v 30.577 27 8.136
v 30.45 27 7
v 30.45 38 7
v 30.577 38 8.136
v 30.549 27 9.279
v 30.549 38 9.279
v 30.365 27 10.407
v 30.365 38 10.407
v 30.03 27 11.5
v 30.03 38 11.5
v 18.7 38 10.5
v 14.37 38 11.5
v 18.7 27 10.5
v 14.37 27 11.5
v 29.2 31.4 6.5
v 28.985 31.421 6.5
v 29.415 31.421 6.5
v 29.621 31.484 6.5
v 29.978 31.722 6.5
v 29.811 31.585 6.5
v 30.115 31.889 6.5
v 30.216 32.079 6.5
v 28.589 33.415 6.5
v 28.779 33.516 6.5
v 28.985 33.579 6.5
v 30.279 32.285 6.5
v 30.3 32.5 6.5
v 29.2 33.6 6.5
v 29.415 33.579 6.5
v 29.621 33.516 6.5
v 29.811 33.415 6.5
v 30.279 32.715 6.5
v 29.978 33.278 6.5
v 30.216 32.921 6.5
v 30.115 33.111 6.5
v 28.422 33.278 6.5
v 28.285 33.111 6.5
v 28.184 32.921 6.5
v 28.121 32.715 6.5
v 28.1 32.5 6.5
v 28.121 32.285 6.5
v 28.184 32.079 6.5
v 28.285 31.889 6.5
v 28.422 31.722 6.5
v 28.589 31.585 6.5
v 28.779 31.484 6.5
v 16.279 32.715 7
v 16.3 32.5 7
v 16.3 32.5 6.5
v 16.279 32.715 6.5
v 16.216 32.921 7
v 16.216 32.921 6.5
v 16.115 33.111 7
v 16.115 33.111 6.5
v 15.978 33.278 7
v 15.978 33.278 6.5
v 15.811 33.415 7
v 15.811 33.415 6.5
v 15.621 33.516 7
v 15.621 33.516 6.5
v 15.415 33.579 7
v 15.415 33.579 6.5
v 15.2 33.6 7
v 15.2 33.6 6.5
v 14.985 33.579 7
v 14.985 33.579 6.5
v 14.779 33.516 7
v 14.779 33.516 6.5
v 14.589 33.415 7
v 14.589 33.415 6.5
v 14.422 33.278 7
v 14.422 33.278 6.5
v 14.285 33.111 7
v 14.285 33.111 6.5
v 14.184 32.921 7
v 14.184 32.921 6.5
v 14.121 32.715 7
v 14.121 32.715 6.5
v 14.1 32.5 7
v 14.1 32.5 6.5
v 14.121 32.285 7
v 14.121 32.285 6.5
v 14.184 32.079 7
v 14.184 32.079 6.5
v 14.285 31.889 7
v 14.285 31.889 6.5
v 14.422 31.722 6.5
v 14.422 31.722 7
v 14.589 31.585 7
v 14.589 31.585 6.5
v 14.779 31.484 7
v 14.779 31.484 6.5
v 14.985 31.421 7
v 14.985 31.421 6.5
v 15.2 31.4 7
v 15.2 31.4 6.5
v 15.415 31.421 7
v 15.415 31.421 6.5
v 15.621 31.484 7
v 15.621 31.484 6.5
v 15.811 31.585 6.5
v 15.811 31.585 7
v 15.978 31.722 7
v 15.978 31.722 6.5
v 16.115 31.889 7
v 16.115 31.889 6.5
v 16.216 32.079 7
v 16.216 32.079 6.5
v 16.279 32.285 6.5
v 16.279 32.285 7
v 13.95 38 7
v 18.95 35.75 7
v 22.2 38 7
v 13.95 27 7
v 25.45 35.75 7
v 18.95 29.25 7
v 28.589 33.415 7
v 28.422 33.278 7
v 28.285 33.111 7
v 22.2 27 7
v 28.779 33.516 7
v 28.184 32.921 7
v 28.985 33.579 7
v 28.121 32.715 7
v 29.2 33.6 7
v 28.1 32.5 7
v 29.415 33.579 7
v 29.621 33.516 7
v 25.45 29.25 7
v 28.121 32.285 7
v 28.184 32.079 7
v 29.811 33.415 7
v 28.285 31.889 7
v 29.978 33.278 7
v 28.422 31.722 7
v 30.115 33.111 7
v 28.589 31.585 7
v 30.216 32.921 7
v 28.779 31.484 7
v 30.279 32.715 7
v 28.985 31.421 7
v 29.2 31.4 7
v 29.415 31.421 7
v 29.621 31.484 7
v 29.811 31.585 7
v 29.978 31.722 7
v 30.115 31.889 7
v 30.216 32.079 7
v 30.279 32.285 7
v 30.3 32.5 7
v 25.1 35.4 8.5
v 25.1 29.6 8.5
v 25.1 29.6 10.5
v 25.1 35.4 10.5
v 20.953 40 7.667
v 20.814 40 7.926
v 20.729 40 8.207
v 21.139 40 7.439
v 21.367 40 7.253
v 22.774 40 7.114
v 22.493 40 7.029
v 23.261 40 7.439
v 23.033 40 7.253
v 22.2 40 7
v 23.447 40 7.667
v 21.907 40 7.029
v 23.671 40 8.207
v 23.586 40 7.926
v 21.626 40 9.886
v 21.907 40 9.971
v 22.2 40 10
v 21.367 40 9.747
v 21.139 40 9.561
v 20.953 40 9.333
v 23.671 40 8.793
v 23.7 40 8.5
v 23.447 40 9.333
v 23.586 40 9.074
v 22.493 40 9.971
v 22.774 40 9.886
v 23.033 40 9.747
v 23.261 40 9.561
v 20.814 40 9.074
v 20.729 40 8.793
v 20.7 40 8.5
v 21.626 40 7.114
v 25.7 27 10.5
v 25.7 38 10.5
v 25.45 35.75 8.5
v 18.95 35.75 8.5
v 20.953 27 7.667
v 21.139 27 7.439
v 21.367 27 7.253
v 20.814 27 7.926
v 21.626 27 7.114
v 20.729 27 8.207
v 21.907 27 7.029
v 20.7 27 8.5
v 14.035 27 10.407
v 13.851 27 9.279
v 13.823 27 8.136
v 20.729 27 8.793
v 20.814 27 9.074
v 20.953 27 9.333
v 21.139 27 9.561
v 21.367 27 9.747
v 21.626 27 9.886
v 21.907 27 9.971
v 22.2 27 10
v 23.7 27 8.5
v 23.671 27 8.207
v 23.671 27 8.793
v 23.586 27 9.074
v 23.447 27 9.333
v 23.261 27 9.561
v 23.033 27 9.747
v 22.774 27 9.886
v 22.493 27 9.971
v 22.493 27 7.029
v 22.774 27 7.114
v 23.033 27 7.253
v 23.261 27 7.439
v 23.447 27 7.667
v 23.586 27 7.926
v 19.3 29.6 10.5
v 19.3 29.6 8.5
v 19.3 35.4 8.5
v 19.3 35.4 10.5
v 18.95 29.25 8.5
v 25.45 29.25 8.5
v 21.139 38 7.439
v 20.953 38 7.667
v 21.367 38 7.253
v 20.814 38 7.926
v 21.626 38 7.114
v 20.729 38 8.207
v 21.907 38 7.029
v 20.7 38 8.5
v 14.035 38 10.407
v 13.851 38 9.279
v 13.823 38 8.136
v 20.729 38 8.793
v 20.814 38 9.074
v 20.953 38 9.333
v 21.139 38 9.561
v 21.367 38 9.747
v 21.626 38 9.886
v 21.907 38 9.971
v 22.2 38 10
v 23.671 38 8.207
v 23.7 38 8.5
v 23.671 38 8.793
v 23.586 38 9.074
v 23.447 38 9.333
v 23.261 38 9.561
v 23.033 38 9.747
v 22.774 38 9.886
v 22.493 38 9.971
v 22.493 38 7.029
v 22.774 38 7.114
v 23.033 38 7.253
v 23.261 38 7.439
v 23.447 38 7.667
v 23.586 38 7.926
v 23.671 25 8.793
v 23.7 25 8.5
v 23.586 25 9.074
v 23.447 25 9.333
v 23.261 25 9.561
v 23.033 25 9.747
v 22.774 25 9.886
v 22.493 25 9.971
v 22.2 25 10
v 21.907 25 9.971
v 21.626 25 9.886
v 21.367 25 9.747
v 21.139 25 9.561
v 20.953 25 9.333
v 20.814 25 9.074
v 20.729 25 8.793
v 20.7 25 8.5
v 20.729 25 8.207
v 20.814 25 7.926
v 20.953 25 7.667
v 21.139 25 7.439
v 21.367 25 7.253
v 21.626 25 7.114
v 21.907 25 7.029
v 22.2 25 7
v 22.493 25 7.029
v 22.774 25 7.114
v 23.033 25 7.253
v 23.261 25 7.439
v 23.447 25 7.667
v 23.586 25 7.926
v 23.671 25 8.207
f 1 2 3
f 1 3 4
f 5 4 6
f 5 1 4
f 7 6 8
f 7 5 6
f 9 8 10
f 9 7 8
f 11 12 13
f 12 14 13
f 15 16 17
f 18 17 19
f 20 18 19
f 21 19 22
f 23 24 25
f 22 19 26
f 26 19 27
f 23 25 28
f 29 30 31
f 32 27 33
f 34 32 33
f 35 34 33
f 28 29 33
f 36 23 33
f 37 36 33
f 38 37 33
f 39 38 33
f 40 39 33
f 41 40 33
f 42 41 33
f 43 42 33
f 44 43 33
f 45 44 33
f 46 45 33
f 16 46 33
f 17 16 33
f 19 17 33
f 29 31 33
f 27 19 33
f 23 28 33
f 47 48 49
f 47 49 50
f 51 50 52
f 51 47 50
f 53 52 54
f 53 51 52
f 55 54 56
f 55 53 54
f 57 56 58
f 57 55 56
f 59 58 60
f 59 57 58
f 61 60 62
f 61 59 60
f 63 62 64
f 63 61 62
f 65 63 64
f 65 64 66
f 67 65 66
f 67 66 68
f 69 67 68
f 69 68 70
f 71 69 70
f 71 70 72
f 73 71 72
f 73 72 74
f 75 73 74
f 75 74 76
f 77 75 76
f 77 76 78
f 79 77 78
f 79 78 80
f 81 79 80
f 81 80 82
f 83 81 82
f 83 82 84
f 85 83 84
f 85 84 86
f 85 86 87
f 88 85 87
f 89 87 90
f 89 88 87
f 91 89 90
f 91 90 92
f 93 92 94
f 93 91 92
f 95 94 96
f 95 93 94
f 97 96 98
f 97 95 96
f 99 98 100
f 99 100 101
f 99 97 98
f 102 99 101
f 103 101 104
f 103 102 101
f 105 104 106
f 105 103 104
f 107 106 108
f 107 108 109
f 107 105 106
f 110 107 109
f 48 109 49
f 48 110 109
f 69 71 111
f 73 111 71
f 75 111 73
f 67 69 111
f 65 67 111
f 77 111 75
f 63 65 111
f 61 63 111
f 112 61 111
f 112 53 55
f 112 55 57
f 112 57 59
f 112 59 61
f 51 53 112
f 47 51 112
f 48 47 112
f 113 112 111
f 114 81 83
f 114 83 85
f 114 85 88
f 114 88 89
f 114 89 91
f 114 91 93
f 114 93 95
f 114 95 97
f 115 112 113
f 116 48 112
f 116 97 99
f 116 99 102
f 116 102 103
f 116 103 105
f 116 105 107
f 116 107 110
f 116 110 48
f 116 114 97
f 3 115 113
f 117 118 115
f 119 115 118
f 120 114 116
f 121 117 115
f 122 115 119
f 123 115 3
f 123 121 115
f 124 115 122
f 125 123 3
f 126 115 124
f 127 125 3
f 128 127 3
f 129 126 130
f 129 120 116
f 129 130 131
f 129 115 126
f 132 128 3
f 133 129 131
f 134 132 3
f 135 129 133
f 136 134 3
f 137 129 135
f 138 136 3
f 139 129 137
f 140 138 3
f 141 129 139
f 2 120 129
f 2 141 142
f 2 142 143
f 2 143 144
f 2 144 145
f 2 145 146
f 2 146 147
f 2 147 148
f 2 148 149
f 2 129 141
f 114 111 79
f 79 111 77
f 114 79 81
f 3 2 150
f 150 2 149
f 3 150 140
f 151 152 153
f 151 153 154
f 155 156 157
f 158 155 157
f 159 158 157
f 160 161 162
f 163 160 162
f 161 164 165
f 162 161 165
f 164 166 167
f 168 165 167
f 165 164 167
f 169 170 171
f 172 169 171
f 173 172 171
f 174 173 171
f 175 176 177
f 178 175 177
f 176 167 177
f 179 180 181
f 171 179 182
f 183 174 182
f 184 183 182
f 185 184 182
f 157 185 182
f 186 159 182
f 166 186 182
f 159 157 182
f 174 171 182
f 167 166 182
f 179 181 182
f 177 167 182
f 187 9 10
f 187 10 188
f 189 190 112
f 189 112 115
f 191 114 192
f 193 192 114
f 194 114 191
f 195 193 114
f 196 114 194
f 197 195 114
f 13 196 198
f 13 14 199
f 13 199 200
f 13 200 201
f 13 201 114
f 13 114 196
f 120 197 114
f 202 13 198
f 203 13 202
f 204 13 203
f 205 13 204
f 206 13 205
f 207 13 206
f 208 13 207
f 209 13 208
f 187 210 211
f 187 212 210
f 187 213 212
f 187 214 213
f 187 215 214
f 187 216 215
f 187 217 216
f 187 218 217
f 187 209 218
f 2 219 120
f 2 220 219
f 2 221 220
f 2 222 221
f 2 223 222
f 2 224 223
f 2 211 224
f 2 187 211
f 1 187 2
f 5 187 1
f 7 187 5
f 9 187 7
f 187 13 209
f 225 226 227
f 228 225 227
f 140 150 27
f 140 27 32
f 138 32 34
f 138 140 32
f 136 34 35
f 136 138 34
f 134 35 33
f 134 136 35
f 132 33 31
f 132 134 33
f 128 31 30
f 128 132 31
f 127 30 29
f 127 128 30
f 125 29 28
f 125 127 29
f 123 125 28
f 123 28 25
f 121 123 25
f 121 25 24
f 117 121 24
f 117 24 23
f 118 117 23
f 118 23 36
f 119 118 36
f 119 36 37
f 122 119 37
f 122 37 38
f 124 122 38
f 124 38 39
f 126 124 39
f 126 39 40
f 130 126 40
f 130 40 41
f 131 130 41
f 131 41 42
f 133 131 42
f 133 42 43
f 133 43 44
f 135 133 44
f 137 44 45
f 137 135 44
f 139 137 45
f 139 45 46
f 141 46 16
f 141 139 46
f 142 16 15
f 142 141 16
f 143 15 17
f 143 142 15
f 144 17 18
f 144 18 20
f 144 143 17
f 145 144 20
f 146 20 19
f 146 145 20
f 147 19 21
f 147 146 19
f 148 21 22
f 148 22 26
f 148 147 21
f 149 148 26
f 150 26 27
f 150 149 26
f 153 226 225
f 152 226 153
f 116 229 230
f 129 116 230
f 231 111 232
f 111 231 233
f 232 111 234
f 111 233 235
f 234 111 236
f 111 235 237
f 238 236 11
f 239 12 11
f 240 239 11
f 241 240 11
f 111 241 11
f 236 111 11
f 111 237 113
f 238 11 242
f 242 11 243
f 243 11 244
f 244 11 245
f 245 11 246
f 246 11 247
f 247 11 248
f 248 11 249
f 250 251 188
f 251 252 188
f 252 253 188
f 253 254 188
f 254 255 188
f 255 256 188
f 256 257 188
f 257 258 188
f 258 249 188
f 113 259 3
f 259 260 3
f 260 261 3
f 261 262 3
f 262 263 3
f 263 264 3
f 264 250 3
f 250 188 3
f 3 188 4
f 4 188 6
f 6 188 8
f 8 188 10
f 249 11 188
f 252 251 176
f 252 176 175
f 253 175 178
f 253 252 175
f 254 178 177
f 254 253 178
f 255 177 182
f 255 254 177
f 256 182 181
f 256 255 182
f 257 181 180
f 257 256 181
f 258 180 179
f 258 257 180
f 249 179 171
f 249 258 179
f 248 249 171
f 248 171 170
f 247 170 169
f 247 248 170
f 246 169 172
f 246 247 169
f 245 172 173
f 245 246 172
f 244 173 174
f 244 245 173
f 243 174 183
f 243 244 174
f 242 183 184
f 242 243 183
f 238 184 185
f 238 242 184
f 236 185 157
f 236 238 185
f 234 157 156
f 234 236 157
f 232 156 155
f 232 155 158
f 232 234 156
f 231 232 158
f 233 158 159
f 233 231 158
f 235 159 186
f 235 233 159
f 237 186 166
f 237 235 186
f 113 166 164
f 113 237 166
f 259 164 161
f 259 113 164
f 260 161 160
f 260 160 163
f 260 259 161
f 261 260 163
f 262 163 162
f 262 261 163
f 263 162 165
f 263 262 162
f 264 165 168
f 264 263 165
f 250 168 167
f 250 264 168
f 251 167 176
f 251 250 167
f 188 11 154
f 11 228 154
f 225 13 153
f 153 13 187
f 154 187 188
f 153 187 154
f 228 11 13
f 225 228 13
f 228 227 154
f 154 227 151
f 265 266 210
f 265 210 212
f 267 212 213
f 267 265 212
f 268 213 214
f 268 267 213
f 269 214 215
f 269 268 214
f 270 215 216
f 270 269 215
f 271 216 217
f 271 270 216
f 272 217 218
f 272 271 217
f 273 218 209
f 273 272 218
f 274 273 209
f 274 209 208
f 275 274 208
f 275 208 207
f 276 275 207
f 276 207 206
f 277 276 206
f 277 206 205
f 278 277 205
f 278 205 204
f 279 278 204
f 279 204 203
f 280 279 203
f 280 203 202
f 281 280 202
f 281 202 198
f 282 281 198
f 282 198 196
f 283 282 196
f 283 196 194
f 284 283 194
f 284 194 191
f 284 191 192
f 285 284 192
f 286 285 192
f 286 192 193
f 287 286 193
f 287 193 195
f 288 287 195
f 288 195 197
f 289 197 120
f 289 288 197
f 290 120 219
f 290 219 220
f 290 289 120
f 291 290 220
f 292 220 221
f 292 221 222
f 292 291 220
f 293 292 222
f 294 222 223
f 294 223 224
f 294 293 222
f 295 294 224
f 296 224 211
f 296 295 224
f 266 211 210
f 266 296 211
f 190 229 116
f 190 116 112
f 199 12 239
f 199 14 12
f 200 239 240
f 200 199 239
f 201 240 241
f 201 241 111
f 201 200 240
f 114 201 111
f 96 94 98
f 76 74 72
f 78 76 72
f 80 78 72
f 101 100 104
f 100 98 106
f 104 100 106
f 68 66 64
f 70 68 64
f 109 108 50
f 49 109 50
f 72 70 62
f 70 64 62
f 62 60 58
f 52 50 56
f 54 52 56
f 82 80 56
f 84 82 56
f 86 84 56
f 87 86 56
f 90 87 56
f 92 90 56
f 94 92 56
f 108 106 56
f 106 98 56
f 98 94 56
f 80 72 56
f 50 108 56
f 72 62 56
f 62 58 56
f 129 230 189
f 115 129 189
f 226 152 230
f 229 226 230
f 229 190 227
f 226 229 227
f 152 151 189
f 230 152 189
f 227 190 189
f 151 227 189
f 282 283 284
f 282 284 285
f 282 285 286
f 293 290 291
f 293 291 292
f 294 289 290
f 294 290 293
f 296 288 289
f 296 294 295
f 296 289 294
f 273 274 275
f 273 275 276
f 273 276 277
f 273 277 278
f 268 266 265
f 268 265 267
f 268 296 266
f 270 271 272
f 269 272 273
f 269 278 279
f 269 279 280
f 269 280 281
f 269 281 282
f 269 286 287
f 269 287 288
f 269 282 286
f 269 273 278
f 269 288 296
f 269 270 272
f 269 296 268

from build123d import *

# Parameters (mm, degrees)
PAD009_DEPTH         = 5.5
SKETCH015_R          = 1.5
PAD010_DEPTH         = 7.5
SKETCH016_W          = 5.8
SKETCH016_H          = 5.8
POCKET005_DEPTH      = 1.501
POCKET005_DEPTH_BACK = 3.001
SKETCH019_W          = 6.5
SKETCH019_H          = 6.5
POCKET006_DEPTH      = 1.501
SKETCH017_R          = 1.1
PAD011_DEPTH         = 2


with BuildPart() as part:
    # Sketch014 → Pad009 (new body, symmetric)
    with BuildSketch(Plane.XZ):
        with BuildLine():
            ThreePointArc((14.36977, 3), (13.850991, 0.778814), (13.95, -1.5))
            Line((13.95, -1.5), (30.45, -1.5))
            ThreePointArc((30.45, -1.5), (30.549009, 0.778814), (30.03023, 3))
            Line((30.03023, 3), (25.7, 2))
            Line((18.7, 2), (25.7, 2))
            Line((14.36977, 3), (18.7, 2))
        make_face()
    extrude(amount=PAD009_DEPTH, both=True)

    # Sketch015 → Pad010 (join, symmetric)
    with BuildSketch(Plane.XZ):
        with Locations((22.2, 0)):
            Circle(SKETCH015_R)
    extrude(amount=PAD010_DEPTH, both=True)

    # Sketch016 → Pocket005 (cut, two sides)
    with BuildSketch(Plane.XY) as pocket005_sk:
        with Locations((22.2, 0)):
            Rectangle(SKETCH016_W, SKETCH016_H)
    extrude(amount=-POCKET005_DEPTH, mode=Mode.SUBTRACT)
    extrude(pocket005_sk.sketch, amount=POCKET005_DEPTH_BACK, mode=Mode.SUBTRACT)

    # Sketch019 → Pocket006 (cut, through all)
    with BuildSketch(Plane.XY):
        with Locations((22.2, 0)):
            Rectangle(SKETCH019_W, SKETCH019_H)
    extrude(amount=-POCKET006_DEPTH, mode=Mode.SUBTRACT)

    # Sketch017 → Pad011 (join)
    with BuildSketch(Plane.XY):
        with Locations((15.2, 0)):
            Circle(SKETCH017_R)
        with Locations((29.2, 0)):
            Circle(SKETCH017_R)
    extrude(amount=-PAD011_DEPTH)


with BuildPart() as part_1:
    # Body005 placement: moved
    add(part.part.moved(Location((0, 32.5, 8.5))))


solid = part_1.part
